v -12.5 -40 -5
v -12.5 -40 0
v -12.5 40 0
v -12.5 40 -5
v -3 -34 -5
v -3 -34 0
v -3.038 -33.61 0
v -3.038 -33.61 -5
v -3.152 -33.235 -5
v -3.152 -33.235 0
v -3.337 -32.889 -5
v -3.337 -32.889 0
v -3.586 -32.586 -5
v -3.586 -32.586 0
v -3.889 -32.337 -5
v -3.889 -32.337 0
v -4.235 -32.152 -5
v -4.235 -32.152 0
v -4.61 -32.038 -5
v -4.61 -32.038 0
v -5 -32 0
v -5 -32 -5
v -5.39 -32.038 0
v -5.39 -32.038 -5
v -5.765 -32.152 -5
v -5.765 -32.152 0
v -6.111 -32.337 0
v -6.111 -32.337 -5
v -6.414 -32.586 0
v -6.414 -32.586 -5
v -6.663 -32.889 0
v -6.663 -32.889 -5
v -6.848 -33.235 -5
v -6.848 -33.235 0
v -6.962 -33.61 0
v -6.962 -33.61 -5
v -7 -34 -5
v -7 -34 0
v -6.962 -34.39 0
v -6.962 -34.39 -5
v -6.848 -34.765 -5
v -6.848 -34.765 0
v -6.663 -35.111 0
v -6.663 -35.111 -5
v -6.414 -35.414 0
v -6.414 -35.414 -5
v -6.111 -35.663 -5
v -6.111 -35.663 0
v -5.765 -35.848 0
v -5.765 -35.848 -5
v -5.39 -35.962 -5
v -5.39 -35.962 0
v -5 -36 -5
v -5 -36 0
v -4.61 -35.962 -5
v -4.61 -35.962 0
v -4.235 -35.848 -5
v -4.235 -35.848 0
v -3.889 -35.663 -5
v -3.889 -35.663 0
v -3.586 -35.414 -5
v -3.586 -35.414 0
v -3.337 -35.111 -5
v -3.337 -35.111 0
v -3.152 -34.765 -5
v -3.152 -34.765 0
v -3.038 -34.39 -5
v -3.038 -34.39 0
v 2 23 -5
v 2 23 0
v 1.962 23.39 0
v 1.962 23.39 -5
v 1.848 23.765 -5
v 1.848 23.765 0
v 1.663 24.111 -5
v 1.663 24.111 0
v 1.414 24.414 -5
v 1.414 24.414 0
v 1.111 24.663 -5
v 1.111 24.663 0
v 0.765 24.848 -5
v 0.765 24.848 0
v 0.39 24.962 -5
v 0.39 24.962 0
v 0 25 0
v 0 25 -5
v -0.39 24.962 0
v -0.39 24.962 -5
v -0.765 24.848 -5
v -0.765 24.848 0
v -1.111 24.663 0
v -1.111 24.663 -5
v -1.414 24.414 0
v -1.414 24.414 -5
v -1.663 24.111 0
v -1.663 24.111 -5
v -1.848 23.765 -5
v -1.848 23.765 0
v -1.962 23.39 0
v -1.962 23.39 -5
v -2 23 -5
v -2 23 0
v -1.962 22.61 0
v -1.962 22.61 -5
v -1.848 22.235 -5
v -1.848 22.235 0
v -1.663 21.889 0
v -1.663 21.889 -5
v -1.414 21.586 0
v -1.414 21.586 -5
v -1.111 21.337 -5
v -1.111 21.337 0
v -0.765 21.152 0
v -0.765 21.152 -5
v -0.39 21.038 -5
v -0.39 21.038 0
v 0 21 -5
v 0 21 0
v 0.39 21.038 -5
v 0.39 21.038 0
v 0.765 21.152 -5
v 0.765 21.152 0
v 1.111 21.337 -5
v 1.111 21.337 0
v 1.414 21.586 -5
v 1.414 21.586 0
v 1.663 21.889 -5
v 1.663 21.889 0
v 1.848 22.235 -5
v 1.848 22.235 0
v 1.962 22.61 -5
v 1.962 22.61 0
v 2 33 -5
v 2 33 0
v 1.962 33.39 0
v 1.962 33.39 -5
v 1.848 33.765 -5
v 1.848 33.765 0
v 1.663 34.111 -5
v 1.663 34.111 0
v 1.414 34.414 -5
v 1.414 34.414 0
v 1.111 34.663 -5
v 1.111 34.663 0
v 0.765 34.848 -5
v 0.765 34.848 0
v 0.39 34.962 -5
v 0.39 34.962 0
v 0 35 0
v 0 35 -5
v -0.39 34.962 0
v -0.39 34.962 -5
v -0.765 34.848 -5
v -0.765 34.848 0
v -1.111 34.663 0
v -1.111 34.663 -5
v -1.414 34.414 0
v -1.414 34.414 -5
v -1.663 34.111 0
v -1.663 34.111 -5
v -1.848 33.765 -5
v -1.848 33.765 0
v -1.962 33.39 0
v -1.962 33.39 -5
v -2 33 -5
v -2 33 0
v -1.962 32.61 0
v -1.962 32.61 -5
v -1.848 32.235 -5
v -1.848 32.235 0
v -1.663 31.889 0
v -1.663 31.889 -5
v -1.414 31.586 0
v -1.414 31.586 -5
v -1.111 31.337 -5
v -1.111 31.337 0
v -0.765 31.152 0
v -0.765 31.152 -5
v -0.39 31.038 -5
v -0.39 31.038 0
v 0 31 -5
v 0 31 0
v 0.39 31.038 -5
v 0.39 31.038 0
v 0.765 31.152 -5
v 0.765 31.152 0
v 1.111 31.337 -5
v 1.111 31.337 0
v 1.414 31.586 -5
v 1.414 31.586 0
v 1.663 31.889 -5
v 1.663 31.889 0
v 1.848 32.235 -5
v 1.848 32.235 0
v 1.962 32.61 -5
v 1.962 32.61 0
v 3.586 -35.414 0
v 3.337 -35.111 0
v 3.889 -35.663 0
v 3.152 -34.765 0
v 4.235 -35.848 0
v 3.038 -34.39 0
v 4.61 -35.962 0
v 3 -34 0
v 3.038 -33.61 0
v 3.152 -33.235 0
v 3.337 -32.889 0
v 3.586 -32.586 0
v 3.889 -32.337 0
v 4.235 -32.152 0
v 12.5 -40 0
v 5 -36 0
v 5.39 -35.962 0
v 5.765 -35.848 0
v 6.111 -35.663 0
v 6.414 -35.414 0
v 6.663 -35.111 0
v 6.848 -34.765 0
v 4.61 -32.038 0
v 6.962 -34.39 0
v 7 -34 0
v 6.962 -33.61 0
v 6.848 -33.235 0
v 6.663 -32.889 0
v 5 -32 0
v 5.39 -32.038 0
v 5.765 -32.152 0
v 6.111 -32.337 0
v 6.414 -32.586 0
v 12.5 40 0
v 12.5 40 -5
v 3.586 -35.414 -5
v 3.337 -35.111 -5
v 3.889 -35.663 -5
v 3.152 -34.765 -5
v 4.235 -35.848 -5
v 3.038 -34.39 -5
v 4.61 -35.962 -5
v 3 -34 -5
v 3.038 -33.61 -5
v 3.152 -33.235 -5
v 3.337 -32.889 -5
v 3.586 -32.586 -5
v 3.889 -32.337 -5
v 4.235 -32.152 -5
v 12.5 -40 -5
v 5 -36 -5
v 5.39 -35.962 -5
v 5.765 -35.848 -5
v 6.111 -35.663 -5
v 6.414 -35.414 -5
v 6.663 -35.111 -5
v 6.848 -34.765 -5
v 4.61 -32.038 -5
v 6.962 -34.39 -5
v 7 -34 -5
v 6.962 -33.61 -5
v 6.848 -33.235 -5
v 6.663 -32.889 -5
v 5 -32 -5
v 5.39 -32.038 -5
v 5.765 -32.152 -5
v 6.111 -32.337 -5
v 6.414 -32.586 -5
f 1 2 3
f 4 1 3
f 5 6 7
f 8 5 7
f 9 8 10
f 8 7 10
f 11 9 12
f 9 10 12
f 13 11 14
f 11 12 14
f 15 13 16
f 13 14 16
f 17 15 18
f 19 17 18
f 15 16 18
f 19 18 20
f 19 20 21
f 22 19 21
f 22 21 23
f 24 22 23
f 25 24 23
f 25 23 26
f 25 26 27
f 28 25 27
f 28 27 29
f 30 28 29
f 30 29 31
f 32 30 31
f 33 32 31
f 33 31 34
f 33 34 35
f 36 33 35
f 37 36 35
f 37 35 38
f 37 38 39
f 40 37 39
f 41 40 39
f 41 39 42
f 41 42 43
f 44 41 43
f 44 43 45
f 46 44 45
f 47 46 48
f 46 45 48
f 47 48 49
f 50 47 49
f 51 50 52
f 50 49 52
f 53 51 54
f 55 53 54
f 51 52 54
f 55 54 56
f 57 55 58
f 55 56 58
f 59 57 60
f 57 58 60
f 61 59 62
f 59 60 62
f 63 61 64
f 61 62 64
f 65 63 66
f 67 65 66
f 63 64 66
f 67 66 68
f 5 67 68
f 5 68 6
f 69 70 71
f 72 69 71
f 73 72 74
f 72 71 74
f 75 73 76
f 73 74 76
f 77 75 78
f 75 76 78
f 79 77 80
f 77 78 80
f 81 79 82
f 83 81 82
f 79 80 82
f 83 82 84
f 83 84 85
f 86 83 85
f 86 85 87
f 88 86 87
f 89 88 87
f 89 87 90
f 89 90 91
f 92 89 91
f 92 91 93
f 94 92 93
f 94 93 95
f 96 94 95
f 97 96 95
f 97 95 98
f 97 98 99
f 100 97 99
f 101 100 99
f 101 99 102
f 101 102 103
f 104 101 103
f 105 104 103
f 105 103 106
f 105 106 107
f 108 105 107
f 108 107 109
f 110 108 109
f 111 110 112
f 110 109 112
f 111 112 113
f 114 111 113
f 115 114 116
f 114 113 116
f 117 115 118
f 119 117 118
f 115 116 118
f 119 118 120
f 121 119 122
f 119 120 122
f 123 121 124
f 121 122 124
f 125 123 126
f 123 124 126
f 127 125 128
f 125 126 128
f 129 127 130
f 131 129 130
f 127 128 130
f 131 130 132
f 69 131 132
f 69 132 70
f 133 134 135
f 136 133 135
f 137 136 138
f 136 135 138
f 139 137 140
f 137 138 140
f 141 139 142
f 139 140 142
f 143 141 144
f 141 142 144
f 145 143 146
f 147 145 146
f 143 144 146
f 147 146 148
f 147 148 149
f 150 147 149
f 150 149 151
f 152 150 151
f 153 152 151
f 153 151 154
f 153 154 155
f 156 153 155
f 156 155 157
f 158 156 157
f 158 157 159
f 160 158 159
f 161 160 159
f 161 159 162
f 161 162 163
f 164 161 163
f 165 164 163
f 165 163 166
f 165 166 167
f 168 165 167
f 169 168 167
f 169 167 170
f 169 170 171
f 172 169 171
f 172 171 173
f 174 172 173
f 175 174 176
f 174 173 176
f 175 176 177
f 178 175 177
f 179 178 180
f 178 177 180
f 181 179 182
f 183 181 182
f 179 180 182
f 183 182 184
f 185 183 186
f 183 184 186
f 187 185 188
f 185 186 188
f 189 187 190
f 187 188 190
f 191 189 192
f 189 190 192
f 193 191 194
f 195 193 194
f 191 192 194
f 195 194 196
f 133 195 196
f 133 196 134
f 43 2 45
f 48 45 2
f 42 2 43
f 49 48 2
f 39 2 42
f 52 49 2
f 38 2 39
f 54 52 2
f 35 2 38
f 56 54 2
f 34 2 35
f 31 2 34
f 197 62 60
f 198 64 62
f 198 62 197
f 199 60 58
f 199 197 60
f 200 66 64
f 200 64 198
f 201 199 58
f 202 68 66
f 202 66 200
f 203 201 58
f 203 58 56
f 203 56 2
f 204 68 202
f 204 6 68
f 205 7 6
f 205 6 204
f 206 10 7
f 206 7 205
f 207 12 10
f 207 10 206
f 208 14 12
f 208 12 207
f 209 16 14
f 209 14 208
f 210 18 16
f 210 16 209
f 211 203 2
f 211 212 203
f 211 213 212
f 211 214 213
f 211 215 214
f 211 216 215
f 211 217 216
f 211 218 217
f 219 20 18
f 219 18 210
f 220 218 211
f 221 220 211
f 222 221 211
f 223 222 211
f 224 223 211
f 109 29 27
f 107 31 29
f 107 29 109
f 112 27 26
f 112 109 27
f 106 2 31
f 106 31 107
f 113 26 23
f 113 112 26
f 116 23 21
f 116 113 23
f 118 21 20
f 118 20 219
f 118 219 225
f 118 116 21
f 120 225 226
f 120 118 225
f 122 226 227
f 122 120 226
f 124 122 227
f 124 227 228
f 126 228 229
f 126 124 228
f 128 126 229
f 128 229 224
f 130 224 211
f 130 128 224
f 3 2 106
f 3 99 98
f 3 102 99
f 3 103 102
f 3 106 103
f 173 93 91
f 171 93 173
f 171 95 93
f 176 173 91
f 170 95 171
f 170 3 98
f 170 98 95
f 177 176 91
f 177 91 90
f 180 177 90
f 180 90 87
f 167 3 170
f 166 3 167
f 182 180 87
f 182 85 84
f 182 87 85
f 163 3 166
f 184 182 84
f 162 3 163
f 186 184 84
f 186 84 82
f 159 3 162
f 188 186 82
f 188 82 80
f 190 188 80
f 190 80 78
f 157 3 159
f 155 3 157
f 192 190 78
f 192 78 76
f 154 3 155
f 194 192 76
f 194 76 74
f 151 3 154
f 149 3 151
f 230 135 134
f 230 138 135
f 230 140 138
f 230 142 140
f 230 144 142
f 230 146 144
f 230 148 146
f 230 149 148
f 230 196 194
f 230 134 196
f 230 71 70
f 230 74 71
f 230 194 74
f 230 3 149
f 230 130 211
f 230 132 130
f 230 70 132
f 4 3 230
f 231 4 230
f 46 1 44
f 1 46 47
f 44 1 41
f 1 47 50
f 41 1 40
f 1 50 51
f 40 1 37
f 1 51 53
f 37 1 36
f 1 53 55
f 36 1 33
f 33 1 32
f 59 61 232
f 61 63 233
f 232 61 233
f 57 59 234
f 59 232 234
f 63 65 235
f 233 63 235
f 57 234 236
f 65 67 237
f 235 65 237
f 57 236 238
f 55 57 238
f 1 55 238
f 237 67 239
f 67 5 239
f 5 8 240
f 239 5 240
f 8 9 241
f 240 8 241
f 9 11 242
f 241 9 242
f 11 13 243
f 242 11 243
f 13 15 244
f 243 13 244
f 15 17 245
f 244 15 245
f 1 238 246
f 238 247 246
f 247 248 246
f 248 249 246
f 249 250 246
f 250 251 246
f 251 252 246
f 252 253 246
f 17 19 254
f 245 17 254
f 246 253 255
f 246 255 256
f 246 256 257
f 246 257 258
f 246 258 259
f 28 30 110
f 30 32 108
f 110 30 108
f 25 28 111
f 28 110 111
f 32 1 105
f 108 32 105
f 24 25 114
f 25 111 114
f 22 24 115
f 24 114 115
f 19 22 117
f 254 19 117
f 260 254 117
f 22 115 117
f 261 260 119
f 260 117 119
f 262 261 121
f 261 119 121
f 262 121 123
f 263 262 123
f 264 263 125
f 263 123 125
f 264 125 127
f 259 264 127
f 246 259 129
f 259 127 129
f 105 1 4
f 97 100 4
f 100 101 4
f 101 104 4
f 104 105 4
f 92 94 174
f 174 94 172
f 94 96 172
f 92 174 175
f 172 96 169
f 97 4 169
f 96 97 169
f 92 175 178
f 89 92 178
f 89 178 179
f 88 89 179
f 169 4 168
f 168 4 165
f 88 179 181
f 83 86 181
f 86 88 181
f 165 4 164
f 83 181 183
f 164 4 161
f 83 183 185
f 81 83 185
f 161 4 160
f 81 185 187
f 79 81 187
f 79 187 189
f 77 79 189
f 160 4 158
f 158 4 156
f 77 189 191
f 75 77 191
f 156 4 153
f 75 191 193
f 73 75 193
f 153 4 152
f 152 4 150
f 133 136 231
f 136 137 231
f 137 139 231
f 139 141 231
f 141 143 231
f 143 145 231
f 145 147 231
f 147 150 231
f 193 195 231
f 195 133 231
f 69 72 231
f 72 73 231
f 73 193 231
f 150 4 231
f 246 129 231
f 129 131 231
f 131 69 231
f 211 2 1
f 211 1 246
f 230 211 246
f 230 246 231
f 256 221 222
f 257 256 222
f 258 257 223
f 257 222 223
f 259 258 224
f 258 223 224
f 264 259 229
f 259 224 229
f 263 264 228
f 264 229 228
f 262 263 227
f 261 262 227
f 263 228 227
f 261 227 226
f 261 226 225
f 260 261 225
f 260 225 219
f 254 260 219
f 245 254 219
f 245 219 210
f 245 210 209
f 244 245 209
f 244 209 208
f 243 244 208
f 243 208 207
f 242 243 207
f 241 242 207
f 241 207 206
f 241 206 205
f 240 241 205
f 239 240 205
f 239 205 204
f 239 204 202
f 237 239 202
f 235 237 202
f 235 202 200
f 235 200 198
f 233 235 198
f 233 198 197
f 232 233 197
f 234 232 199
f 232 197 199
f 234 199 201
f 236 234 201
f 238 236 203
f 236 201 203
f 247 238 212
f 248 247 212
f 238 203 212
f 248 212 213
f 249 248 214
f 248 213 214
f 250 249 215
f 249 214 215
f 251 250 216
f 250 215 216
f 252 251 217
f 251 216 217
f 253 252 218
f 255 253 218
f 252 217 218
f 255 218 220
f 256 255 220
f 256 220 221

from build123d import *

# Parameters (mm, degrees)
SKETCH_1_W          = 25
SKETCH_1_H          = 80
EXTRUDE_1_DEPTH     = 5
SKETCH_2_R          = 2
CUT_EXTRUDE_1_DEPTH = 6


with BuildPart() as part:
    # 草图1 → 凸台-拉伸1 (new body)
    with BuildSketch(Plane.XY):
        Rectangle(SKETCH_1_W, SKETCH_1_H)
    extrude(amount=-EXTRUDE_1_DEPTH)

    # 草图2 → 切除-拉伸1 (cut, through all)
    with BuildSketch(Plane.XY):
        with Locations((0, 33)):
            Circle(SKETCH_2_R)
        with Locations((0, 23)):
            Circle(SKETCH_2_R)
        with Locations((-5, -34)):
            Circle(SKETCH_2_R)
        with Locations((5, -34)):
            Circle(SKETCH_2_R)
    extrude(amount=-CUT_EXTRUDE_1_DEPTH, mode=Mode.SUBTRACT)


solid = part.part
